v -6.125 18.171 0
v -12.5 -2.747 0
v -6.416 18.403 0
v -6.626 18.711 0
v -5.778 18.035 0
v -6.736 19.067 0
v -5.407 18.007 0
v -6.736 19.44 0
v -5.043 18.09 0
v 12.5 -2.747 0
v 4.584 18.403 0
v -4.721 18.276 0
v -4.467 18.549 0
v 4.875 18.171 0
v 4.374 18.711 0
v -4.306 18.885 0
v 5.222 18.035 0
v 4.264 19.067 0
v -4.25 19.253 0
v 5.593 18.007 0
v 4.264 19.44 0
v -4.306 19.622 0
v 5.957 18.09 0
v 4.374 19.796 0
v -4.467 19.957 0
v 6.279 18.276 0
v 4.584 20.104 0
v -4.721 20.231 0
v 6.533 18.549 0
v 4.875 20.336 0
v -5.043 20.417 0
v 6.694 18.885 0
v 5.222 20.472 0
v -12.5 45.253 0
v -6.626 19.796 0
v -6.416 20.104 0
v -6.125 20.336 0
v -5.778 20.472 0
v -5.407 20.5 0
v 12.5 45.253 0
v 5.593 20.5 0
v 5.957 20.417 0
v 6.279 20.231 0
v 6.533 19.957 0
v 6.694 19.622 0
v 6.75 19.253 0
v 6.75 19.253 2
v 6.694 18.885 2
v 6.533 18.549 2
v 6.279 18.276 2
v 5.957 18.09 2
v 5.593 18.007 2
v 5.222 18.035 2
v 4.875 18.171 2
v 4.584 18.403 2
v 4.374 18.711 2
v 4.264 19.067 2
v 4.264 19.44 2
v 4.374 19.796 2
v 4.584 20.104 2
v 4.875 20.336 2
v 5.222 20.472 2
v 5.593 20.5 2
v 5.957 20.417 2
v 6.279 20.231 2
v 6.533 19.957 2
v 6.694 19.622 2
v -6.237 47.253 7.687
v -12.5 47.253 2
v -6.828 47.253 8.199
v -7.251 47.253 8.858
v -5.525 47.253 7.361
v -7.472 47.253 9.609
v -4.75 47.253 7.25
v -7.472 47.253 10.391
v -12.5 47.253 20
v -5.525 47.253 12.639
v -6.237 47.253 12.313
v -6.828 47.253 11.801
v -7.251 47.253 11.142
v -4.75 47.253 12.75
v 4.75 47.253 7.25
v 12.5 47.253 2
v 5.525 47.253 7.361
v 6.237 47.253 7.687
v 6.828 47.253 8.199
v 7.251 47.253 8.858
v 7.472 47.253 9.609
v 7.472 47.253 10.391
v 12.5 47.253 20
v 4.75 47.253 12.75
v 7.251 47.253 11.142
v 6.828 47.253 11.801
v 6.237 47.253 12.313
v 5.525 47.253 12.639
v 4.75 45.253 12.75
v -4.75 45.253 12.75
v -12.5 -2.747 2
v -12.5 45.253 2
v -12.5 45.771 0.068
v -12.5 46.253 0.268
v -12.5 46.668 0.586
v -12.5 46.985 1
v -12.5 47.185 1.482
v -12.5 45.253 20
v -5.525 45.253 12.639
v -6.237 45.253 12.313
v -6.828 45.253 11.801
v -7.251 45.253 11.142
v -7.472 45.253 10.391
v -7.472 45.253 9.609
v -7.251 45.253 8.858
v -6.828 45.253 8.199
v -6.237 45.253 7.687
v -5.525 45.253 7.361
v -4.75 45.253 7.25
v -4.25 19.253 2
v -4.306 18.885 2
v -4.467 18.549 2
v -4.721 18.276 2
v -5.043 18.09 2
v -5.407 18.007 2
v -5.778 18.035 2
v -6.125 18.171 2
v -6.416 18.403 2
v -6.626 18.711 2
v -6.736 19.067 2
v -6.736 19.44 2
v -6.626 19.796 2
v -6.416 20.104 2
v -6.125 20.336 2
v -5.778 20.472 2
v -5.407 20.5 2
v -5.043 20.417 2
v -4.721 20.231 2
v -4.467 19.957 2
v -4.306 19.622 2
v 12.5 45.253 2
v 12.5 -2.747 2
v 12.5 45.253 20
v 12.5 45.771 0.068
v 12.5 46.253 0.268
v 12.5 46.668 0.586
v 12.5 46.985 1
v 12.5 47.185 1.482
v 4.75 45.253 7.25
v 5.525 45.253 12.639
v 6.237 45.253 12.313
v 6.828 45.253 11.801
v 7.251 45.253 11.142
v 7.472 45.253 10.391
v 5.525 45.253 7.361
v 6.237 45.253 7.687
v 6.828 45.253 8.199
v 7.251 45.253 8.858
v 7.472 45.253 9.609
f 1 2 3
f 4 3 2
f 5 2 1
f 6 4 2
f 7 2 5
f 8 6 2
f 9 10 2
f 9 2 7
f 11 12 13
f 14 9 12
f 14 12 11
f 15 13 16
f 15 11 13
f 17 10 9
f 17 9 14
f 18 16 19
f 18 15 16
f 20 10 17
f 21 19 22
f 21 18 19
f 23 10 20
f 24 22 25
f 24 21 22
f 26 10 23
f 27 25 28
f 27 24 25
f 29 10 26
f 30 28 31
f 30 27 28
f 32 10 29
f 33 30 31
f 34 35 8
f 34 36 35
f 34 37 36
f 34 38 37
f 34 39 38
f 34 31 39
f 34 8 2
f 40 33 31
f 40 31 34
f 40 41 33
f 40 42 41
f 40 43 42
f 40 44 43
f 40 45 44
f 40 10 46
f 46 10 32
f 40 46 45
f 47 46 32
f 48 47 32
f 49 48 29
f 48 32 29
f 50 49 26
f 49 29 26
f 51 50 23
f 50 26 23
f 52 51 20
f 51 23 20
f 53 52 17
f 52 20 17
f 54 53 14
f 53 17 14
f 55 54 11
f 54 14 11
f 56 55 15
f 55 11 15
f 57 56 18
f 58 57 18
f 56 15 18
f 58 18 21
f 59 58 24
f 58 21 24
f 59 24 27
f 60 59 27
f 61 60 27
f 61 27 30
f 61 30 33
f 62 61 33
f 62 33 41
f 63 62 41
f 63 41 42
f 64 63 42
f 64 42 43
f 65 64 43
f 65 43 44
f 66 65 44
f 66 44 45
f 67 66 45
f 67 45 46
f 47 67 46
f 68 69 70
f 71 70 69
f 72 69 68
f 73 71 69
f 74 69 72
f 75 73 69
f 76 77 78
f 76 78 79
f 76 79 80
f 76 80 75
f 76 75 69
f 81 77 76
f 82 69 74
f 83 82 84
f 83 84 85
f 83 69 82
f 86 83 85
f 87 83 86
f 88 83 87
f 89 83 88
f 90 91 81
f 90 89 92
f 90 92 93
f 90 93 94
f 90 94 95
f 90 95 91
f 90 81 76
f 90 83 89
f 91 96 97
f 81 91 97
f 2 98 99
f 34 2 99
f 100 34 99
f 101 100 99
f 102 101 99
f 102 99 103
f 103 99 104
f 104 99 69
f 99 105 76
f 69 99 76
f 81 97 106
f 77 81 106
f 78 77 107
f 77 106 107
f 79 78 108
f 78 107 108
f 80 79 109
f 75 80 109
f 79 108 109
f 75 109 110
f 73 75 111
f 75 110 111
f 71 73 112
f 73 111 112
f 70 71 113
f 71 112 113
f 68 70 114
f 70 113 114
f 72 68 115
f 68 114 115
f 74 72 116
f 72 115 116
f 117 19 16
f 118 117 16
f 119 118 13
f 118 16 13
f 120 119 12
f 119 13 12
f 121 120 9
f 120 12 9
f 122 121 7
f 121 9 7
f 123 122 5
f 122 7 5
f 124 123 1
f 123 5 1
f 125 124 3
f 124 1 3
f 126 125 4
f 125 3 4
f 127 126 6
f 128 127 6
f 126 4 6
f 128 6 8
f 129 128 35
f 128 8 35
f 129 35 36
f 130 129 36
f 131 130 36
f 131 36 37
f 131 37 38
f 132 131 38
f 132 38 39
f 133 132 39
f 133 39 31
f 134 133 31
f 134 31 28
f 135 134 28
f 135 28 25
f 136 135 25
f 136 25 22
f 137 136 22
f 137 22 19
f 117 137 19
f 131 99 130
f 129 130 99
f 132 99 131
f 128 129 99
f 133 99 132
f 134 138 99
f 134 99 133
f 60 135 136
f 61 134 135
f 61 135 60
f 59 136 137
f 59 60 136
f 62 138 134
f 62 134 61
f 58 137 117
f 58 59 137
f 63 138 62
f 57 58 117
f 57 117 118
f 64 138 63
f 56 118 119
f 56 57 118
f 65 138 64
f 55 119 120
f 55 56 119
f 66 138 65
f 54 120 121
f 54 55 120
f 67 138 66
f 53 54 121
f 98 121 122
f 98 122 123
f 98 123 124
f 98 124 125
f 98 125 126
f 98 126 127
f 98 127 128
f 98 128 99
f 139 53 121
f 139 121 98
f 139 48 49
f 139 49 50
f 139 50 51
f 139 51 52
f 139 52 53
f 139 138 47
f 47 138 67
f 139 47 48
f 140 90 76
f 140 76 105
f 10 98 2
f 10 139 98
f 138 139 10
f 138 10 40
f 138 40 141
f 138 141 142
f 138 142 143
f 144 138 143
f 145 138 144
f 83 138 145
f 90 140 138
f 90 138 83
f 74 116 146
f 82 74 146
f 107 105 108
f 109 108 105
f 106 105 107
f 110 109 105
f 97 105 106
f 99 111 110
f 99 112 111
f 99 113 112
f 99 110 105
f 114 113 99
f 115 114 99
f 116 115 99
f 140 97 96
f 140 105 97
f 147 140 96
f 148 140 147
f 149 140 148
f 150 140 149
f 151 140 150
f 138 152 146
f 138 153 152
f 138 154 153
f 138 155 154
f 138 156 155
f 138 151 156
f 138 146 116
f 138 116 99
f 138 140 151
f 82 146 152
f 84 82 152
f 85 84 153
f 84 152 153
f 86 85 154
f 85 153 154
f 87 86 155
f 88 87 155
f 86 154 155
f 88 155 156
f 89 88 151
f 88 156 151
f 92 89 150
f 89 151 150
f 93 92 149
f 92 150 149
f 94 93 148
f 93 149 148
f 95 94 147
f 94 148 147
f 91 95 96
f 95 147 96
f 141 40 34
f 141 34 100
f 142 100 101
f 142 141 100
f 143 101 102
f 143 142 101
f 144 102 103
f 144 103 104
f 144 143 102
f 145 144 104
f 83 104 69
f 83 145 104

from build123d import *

# Parameters (mm, degrees)
F1_DEPTH = 12.5
F3_DEPTH = 25
F4_R     = 1.25
F5_DEPTH = 25


with BuildPart() as f1:
    # F0 (on Right) → F1 (new body, symmetric)
    with BuildSketch(Plane.YZ):
        with BuildLine():
            Line((-2.746685, 2), (-2.746685, 0))
            Line((-2.746685, 0), (45.253315, 0))
            ThreePointArc((45.253315, 0), (46.667529, 0.585786), (47.253315, 2))
            Line((47.253315, 2), (47.253315, 20))
            Line((47.253315, 20), (45.253315, 20))
            Line((45.253315, 20), (45.253315, 2))
            Line((45.253315, 2), (-2.746685, 2))
        make_face()
    extrude(amount=F1_DEPTH, both=True)

    # F2 (on face) → F3 (cut)
    with BuildSketch(Plane.XZ.offset(-45.253315)):
        with BuildLine():
            Line((4.75, 12.75), (-4.75, 12.75))
            ThreePointArc((-4.75, 12.75), (-7.5, 10), (-4.75, 7.25))
            Line((-4.75, 7.25), (4.75, 7.25))
            ThreePointArc((4.75, 7.25), (7.5, 10), (4.75, 12.75))
        make_face()
    extrude(amount=-F3_DEPTH, mode=Mode.SUBTRACT)

    # F4 (on face) → F5 (cut)
    with BuildSketch(Plane(origin=(0, 0, 0), x_dir=(1, 0, 0), z_dir=(0, 0, -1))):
        with Locations((5.5, -19.253315)):
            Circle(F4_R)
        with Locations((-5.5, -19.253315)):
            Circle(F4_R)
    extrude(amount=-F5_DEPTH, mode=Mode.SUBTRACT)


solid = f1.part
